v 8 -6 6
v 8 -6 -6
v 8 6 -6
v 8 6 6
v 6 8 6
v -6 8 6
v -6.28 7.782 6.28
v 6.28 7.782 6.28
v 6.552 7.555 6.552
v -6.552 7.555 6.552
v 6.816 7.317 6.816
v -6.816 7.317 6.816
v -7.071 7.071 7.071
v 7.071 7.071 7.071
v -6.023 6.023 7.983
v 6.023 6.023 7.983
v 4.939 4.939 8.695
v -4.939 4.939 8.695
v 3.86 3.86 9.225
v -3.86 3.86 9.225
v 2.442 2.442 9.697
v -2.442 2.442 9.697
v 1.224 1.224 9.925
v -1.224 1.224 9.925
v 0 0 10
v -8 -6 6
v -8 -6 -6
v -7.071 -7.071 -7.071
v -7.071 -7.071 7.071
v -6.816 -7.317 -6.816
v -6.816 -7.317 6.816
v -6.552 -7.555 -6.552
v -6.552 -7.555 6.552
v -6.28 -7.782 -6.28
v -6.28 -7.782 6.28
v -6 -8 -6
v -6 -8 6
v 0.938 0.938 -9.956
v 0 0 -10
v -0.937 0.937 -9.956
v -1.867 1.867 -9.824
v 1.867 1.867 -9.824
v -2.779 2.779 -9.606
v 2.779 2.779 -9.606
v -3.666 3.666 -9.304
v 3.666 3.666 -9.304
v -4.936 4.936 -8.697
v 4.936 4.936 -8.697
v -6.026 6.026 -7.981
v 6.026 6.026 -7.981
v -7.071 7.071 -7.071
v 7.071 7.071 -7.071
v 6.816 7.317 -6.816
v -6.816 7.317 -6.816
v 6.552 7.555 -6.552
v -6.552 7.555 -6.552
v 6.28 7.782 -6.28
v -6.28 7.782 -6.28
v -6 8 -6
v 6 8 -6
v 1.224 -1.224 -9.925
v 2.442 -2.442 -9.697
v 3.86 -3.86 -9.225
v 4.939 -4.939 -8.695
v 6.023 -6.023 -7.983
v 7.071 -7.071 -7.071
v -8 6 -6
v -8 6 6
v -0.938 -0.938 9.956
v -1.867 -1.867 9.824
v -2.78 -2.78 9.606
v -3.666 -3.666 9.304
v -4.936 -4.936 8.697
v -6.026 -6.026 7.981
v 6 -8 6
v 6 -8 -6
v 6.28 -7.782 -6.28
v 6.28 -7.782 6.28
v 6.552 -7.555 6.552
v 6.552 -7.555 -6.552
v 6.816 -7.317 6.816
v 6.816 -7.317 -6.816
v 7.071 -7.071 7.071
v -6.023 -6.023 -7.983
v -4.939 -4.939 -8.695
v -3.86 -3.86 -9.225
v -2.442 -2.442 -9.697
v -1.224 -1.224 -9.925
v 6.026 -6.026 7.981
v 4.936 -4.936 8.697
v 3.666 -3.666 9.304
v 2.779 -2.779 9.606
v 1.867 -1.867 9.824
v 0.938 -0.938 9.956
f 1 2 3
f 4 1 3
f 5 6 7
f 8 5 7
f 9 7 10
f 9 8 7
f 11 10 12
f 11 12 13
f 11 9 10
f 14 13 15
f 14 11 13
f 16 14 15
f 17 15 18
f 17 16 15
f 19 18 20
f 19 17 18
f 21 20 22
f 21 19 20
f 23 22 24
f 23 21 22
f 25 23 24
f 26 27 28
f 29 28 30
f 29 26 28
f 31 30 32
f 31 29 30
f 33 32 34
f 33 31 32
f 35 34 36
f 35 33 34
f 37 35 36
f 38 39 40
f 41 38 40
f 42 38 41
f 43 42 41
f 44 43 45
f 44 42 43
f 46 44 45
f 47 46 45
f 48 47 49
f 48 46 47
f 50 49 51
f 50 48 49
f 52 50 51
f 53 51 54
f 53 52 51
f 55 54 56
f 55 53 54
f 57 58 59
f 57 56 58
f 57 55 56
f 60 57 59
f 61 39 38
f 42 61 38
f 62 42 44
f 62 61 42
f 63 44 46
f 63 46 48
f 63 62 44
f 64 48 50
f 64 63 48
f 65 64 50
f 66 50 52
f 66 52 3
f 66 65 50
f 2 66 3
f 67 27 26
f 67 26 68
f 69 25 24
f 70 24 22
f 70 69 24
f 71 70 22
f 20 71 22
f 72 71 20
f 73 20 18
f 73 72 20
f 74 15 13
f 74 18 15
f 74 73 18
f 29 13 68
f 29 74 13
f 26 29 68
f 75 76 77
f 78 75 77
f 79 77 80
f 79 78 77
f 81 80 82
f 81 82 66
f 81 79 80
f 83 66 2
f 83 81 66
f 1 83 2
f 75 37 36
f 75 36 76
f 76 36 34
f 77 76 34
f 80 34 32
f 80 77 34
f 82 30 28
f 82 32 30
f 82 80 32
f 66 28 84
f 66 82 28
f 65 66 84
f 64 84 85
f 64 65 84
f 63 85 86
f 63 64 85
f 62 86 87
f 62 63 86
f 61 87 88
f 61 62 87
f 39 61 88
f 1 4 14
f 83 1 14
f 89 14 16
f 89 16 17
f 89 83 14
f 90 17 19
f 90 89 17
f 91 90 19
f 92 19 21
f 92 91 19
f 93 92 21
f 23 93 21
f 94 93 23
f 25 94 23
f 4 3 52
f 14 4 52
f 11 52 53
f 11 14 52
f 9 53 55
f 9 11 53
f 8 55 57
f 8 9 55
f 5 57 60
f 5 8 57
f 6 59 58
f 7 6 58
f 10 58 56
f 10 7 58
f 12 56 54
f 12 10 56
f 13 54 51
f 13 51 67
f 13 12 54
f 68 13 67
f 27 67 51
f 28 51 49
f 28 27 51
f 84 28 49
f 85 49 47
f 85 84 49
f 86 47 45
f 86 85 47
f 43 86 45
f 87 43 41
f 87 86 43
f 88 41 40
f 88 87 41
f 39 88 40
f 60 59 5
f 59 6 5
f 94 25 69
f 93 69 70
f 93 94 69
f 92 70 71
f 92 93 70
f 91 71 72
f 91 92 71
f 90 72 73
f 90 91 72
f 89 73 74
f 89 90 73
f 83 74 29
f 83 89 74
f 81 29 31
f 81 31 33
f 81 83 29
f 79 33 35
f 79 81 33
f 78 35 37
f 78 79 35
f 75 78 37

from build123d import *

# Parameters (mm, degrees)
F1_R     = 10
F3_DEPTH = 10
F2_R     = 10
F4_DEPTH = 10
F5_DEPTH = 10
F6_W     = 16
F6_H     = 16
F7_DEPTH = 10


with BuildPart() as f3:
    # F1 (on Top) → F3 (new body, symmetric)
    with BuildSketch(Plane.XY):
        Circle(F1_R)
    extrude(amount=F3_DEPTH, both=True)

    # F2 (on Right) → F4 (intersect, symmetric)
    with BuildSketch(Plane.YZ):
        Circle(F2_R)
    extrude(amount=F4_DEPTH, both=True, mode=Mode.INTERSECT)

    # F0 (on Front) → F5 (intersect, symmetric)
    with BuildSketch(Plane.XZ):
        with BuildLine():
            ThreePointArc((0, -10), (7.071068, -7.071068), (10, 0))
            ThreePointArc((10, 0), (7.071068, 7.071068), (0, 10))
            ThreePointArc((0, 10), (-7.071068, 7.071068), (-10, 0))
            ThreePointArc((-10, 0), (-7.071068, -7.071068), (0, -10))
        make_face()
    extrude(amount=F5_DEPTH, both=True, mode=Mode.INTERSECT)

    # F6 (on Top) → F7 (intersect, symmetric)
    with BuildSketch(Plane.XY):
        Rectangle(F6_W, F6_H)
    extrude(amount=F7_DEPTH, both=True, mode=Mode.INTERSECT)


solid = f3.part
